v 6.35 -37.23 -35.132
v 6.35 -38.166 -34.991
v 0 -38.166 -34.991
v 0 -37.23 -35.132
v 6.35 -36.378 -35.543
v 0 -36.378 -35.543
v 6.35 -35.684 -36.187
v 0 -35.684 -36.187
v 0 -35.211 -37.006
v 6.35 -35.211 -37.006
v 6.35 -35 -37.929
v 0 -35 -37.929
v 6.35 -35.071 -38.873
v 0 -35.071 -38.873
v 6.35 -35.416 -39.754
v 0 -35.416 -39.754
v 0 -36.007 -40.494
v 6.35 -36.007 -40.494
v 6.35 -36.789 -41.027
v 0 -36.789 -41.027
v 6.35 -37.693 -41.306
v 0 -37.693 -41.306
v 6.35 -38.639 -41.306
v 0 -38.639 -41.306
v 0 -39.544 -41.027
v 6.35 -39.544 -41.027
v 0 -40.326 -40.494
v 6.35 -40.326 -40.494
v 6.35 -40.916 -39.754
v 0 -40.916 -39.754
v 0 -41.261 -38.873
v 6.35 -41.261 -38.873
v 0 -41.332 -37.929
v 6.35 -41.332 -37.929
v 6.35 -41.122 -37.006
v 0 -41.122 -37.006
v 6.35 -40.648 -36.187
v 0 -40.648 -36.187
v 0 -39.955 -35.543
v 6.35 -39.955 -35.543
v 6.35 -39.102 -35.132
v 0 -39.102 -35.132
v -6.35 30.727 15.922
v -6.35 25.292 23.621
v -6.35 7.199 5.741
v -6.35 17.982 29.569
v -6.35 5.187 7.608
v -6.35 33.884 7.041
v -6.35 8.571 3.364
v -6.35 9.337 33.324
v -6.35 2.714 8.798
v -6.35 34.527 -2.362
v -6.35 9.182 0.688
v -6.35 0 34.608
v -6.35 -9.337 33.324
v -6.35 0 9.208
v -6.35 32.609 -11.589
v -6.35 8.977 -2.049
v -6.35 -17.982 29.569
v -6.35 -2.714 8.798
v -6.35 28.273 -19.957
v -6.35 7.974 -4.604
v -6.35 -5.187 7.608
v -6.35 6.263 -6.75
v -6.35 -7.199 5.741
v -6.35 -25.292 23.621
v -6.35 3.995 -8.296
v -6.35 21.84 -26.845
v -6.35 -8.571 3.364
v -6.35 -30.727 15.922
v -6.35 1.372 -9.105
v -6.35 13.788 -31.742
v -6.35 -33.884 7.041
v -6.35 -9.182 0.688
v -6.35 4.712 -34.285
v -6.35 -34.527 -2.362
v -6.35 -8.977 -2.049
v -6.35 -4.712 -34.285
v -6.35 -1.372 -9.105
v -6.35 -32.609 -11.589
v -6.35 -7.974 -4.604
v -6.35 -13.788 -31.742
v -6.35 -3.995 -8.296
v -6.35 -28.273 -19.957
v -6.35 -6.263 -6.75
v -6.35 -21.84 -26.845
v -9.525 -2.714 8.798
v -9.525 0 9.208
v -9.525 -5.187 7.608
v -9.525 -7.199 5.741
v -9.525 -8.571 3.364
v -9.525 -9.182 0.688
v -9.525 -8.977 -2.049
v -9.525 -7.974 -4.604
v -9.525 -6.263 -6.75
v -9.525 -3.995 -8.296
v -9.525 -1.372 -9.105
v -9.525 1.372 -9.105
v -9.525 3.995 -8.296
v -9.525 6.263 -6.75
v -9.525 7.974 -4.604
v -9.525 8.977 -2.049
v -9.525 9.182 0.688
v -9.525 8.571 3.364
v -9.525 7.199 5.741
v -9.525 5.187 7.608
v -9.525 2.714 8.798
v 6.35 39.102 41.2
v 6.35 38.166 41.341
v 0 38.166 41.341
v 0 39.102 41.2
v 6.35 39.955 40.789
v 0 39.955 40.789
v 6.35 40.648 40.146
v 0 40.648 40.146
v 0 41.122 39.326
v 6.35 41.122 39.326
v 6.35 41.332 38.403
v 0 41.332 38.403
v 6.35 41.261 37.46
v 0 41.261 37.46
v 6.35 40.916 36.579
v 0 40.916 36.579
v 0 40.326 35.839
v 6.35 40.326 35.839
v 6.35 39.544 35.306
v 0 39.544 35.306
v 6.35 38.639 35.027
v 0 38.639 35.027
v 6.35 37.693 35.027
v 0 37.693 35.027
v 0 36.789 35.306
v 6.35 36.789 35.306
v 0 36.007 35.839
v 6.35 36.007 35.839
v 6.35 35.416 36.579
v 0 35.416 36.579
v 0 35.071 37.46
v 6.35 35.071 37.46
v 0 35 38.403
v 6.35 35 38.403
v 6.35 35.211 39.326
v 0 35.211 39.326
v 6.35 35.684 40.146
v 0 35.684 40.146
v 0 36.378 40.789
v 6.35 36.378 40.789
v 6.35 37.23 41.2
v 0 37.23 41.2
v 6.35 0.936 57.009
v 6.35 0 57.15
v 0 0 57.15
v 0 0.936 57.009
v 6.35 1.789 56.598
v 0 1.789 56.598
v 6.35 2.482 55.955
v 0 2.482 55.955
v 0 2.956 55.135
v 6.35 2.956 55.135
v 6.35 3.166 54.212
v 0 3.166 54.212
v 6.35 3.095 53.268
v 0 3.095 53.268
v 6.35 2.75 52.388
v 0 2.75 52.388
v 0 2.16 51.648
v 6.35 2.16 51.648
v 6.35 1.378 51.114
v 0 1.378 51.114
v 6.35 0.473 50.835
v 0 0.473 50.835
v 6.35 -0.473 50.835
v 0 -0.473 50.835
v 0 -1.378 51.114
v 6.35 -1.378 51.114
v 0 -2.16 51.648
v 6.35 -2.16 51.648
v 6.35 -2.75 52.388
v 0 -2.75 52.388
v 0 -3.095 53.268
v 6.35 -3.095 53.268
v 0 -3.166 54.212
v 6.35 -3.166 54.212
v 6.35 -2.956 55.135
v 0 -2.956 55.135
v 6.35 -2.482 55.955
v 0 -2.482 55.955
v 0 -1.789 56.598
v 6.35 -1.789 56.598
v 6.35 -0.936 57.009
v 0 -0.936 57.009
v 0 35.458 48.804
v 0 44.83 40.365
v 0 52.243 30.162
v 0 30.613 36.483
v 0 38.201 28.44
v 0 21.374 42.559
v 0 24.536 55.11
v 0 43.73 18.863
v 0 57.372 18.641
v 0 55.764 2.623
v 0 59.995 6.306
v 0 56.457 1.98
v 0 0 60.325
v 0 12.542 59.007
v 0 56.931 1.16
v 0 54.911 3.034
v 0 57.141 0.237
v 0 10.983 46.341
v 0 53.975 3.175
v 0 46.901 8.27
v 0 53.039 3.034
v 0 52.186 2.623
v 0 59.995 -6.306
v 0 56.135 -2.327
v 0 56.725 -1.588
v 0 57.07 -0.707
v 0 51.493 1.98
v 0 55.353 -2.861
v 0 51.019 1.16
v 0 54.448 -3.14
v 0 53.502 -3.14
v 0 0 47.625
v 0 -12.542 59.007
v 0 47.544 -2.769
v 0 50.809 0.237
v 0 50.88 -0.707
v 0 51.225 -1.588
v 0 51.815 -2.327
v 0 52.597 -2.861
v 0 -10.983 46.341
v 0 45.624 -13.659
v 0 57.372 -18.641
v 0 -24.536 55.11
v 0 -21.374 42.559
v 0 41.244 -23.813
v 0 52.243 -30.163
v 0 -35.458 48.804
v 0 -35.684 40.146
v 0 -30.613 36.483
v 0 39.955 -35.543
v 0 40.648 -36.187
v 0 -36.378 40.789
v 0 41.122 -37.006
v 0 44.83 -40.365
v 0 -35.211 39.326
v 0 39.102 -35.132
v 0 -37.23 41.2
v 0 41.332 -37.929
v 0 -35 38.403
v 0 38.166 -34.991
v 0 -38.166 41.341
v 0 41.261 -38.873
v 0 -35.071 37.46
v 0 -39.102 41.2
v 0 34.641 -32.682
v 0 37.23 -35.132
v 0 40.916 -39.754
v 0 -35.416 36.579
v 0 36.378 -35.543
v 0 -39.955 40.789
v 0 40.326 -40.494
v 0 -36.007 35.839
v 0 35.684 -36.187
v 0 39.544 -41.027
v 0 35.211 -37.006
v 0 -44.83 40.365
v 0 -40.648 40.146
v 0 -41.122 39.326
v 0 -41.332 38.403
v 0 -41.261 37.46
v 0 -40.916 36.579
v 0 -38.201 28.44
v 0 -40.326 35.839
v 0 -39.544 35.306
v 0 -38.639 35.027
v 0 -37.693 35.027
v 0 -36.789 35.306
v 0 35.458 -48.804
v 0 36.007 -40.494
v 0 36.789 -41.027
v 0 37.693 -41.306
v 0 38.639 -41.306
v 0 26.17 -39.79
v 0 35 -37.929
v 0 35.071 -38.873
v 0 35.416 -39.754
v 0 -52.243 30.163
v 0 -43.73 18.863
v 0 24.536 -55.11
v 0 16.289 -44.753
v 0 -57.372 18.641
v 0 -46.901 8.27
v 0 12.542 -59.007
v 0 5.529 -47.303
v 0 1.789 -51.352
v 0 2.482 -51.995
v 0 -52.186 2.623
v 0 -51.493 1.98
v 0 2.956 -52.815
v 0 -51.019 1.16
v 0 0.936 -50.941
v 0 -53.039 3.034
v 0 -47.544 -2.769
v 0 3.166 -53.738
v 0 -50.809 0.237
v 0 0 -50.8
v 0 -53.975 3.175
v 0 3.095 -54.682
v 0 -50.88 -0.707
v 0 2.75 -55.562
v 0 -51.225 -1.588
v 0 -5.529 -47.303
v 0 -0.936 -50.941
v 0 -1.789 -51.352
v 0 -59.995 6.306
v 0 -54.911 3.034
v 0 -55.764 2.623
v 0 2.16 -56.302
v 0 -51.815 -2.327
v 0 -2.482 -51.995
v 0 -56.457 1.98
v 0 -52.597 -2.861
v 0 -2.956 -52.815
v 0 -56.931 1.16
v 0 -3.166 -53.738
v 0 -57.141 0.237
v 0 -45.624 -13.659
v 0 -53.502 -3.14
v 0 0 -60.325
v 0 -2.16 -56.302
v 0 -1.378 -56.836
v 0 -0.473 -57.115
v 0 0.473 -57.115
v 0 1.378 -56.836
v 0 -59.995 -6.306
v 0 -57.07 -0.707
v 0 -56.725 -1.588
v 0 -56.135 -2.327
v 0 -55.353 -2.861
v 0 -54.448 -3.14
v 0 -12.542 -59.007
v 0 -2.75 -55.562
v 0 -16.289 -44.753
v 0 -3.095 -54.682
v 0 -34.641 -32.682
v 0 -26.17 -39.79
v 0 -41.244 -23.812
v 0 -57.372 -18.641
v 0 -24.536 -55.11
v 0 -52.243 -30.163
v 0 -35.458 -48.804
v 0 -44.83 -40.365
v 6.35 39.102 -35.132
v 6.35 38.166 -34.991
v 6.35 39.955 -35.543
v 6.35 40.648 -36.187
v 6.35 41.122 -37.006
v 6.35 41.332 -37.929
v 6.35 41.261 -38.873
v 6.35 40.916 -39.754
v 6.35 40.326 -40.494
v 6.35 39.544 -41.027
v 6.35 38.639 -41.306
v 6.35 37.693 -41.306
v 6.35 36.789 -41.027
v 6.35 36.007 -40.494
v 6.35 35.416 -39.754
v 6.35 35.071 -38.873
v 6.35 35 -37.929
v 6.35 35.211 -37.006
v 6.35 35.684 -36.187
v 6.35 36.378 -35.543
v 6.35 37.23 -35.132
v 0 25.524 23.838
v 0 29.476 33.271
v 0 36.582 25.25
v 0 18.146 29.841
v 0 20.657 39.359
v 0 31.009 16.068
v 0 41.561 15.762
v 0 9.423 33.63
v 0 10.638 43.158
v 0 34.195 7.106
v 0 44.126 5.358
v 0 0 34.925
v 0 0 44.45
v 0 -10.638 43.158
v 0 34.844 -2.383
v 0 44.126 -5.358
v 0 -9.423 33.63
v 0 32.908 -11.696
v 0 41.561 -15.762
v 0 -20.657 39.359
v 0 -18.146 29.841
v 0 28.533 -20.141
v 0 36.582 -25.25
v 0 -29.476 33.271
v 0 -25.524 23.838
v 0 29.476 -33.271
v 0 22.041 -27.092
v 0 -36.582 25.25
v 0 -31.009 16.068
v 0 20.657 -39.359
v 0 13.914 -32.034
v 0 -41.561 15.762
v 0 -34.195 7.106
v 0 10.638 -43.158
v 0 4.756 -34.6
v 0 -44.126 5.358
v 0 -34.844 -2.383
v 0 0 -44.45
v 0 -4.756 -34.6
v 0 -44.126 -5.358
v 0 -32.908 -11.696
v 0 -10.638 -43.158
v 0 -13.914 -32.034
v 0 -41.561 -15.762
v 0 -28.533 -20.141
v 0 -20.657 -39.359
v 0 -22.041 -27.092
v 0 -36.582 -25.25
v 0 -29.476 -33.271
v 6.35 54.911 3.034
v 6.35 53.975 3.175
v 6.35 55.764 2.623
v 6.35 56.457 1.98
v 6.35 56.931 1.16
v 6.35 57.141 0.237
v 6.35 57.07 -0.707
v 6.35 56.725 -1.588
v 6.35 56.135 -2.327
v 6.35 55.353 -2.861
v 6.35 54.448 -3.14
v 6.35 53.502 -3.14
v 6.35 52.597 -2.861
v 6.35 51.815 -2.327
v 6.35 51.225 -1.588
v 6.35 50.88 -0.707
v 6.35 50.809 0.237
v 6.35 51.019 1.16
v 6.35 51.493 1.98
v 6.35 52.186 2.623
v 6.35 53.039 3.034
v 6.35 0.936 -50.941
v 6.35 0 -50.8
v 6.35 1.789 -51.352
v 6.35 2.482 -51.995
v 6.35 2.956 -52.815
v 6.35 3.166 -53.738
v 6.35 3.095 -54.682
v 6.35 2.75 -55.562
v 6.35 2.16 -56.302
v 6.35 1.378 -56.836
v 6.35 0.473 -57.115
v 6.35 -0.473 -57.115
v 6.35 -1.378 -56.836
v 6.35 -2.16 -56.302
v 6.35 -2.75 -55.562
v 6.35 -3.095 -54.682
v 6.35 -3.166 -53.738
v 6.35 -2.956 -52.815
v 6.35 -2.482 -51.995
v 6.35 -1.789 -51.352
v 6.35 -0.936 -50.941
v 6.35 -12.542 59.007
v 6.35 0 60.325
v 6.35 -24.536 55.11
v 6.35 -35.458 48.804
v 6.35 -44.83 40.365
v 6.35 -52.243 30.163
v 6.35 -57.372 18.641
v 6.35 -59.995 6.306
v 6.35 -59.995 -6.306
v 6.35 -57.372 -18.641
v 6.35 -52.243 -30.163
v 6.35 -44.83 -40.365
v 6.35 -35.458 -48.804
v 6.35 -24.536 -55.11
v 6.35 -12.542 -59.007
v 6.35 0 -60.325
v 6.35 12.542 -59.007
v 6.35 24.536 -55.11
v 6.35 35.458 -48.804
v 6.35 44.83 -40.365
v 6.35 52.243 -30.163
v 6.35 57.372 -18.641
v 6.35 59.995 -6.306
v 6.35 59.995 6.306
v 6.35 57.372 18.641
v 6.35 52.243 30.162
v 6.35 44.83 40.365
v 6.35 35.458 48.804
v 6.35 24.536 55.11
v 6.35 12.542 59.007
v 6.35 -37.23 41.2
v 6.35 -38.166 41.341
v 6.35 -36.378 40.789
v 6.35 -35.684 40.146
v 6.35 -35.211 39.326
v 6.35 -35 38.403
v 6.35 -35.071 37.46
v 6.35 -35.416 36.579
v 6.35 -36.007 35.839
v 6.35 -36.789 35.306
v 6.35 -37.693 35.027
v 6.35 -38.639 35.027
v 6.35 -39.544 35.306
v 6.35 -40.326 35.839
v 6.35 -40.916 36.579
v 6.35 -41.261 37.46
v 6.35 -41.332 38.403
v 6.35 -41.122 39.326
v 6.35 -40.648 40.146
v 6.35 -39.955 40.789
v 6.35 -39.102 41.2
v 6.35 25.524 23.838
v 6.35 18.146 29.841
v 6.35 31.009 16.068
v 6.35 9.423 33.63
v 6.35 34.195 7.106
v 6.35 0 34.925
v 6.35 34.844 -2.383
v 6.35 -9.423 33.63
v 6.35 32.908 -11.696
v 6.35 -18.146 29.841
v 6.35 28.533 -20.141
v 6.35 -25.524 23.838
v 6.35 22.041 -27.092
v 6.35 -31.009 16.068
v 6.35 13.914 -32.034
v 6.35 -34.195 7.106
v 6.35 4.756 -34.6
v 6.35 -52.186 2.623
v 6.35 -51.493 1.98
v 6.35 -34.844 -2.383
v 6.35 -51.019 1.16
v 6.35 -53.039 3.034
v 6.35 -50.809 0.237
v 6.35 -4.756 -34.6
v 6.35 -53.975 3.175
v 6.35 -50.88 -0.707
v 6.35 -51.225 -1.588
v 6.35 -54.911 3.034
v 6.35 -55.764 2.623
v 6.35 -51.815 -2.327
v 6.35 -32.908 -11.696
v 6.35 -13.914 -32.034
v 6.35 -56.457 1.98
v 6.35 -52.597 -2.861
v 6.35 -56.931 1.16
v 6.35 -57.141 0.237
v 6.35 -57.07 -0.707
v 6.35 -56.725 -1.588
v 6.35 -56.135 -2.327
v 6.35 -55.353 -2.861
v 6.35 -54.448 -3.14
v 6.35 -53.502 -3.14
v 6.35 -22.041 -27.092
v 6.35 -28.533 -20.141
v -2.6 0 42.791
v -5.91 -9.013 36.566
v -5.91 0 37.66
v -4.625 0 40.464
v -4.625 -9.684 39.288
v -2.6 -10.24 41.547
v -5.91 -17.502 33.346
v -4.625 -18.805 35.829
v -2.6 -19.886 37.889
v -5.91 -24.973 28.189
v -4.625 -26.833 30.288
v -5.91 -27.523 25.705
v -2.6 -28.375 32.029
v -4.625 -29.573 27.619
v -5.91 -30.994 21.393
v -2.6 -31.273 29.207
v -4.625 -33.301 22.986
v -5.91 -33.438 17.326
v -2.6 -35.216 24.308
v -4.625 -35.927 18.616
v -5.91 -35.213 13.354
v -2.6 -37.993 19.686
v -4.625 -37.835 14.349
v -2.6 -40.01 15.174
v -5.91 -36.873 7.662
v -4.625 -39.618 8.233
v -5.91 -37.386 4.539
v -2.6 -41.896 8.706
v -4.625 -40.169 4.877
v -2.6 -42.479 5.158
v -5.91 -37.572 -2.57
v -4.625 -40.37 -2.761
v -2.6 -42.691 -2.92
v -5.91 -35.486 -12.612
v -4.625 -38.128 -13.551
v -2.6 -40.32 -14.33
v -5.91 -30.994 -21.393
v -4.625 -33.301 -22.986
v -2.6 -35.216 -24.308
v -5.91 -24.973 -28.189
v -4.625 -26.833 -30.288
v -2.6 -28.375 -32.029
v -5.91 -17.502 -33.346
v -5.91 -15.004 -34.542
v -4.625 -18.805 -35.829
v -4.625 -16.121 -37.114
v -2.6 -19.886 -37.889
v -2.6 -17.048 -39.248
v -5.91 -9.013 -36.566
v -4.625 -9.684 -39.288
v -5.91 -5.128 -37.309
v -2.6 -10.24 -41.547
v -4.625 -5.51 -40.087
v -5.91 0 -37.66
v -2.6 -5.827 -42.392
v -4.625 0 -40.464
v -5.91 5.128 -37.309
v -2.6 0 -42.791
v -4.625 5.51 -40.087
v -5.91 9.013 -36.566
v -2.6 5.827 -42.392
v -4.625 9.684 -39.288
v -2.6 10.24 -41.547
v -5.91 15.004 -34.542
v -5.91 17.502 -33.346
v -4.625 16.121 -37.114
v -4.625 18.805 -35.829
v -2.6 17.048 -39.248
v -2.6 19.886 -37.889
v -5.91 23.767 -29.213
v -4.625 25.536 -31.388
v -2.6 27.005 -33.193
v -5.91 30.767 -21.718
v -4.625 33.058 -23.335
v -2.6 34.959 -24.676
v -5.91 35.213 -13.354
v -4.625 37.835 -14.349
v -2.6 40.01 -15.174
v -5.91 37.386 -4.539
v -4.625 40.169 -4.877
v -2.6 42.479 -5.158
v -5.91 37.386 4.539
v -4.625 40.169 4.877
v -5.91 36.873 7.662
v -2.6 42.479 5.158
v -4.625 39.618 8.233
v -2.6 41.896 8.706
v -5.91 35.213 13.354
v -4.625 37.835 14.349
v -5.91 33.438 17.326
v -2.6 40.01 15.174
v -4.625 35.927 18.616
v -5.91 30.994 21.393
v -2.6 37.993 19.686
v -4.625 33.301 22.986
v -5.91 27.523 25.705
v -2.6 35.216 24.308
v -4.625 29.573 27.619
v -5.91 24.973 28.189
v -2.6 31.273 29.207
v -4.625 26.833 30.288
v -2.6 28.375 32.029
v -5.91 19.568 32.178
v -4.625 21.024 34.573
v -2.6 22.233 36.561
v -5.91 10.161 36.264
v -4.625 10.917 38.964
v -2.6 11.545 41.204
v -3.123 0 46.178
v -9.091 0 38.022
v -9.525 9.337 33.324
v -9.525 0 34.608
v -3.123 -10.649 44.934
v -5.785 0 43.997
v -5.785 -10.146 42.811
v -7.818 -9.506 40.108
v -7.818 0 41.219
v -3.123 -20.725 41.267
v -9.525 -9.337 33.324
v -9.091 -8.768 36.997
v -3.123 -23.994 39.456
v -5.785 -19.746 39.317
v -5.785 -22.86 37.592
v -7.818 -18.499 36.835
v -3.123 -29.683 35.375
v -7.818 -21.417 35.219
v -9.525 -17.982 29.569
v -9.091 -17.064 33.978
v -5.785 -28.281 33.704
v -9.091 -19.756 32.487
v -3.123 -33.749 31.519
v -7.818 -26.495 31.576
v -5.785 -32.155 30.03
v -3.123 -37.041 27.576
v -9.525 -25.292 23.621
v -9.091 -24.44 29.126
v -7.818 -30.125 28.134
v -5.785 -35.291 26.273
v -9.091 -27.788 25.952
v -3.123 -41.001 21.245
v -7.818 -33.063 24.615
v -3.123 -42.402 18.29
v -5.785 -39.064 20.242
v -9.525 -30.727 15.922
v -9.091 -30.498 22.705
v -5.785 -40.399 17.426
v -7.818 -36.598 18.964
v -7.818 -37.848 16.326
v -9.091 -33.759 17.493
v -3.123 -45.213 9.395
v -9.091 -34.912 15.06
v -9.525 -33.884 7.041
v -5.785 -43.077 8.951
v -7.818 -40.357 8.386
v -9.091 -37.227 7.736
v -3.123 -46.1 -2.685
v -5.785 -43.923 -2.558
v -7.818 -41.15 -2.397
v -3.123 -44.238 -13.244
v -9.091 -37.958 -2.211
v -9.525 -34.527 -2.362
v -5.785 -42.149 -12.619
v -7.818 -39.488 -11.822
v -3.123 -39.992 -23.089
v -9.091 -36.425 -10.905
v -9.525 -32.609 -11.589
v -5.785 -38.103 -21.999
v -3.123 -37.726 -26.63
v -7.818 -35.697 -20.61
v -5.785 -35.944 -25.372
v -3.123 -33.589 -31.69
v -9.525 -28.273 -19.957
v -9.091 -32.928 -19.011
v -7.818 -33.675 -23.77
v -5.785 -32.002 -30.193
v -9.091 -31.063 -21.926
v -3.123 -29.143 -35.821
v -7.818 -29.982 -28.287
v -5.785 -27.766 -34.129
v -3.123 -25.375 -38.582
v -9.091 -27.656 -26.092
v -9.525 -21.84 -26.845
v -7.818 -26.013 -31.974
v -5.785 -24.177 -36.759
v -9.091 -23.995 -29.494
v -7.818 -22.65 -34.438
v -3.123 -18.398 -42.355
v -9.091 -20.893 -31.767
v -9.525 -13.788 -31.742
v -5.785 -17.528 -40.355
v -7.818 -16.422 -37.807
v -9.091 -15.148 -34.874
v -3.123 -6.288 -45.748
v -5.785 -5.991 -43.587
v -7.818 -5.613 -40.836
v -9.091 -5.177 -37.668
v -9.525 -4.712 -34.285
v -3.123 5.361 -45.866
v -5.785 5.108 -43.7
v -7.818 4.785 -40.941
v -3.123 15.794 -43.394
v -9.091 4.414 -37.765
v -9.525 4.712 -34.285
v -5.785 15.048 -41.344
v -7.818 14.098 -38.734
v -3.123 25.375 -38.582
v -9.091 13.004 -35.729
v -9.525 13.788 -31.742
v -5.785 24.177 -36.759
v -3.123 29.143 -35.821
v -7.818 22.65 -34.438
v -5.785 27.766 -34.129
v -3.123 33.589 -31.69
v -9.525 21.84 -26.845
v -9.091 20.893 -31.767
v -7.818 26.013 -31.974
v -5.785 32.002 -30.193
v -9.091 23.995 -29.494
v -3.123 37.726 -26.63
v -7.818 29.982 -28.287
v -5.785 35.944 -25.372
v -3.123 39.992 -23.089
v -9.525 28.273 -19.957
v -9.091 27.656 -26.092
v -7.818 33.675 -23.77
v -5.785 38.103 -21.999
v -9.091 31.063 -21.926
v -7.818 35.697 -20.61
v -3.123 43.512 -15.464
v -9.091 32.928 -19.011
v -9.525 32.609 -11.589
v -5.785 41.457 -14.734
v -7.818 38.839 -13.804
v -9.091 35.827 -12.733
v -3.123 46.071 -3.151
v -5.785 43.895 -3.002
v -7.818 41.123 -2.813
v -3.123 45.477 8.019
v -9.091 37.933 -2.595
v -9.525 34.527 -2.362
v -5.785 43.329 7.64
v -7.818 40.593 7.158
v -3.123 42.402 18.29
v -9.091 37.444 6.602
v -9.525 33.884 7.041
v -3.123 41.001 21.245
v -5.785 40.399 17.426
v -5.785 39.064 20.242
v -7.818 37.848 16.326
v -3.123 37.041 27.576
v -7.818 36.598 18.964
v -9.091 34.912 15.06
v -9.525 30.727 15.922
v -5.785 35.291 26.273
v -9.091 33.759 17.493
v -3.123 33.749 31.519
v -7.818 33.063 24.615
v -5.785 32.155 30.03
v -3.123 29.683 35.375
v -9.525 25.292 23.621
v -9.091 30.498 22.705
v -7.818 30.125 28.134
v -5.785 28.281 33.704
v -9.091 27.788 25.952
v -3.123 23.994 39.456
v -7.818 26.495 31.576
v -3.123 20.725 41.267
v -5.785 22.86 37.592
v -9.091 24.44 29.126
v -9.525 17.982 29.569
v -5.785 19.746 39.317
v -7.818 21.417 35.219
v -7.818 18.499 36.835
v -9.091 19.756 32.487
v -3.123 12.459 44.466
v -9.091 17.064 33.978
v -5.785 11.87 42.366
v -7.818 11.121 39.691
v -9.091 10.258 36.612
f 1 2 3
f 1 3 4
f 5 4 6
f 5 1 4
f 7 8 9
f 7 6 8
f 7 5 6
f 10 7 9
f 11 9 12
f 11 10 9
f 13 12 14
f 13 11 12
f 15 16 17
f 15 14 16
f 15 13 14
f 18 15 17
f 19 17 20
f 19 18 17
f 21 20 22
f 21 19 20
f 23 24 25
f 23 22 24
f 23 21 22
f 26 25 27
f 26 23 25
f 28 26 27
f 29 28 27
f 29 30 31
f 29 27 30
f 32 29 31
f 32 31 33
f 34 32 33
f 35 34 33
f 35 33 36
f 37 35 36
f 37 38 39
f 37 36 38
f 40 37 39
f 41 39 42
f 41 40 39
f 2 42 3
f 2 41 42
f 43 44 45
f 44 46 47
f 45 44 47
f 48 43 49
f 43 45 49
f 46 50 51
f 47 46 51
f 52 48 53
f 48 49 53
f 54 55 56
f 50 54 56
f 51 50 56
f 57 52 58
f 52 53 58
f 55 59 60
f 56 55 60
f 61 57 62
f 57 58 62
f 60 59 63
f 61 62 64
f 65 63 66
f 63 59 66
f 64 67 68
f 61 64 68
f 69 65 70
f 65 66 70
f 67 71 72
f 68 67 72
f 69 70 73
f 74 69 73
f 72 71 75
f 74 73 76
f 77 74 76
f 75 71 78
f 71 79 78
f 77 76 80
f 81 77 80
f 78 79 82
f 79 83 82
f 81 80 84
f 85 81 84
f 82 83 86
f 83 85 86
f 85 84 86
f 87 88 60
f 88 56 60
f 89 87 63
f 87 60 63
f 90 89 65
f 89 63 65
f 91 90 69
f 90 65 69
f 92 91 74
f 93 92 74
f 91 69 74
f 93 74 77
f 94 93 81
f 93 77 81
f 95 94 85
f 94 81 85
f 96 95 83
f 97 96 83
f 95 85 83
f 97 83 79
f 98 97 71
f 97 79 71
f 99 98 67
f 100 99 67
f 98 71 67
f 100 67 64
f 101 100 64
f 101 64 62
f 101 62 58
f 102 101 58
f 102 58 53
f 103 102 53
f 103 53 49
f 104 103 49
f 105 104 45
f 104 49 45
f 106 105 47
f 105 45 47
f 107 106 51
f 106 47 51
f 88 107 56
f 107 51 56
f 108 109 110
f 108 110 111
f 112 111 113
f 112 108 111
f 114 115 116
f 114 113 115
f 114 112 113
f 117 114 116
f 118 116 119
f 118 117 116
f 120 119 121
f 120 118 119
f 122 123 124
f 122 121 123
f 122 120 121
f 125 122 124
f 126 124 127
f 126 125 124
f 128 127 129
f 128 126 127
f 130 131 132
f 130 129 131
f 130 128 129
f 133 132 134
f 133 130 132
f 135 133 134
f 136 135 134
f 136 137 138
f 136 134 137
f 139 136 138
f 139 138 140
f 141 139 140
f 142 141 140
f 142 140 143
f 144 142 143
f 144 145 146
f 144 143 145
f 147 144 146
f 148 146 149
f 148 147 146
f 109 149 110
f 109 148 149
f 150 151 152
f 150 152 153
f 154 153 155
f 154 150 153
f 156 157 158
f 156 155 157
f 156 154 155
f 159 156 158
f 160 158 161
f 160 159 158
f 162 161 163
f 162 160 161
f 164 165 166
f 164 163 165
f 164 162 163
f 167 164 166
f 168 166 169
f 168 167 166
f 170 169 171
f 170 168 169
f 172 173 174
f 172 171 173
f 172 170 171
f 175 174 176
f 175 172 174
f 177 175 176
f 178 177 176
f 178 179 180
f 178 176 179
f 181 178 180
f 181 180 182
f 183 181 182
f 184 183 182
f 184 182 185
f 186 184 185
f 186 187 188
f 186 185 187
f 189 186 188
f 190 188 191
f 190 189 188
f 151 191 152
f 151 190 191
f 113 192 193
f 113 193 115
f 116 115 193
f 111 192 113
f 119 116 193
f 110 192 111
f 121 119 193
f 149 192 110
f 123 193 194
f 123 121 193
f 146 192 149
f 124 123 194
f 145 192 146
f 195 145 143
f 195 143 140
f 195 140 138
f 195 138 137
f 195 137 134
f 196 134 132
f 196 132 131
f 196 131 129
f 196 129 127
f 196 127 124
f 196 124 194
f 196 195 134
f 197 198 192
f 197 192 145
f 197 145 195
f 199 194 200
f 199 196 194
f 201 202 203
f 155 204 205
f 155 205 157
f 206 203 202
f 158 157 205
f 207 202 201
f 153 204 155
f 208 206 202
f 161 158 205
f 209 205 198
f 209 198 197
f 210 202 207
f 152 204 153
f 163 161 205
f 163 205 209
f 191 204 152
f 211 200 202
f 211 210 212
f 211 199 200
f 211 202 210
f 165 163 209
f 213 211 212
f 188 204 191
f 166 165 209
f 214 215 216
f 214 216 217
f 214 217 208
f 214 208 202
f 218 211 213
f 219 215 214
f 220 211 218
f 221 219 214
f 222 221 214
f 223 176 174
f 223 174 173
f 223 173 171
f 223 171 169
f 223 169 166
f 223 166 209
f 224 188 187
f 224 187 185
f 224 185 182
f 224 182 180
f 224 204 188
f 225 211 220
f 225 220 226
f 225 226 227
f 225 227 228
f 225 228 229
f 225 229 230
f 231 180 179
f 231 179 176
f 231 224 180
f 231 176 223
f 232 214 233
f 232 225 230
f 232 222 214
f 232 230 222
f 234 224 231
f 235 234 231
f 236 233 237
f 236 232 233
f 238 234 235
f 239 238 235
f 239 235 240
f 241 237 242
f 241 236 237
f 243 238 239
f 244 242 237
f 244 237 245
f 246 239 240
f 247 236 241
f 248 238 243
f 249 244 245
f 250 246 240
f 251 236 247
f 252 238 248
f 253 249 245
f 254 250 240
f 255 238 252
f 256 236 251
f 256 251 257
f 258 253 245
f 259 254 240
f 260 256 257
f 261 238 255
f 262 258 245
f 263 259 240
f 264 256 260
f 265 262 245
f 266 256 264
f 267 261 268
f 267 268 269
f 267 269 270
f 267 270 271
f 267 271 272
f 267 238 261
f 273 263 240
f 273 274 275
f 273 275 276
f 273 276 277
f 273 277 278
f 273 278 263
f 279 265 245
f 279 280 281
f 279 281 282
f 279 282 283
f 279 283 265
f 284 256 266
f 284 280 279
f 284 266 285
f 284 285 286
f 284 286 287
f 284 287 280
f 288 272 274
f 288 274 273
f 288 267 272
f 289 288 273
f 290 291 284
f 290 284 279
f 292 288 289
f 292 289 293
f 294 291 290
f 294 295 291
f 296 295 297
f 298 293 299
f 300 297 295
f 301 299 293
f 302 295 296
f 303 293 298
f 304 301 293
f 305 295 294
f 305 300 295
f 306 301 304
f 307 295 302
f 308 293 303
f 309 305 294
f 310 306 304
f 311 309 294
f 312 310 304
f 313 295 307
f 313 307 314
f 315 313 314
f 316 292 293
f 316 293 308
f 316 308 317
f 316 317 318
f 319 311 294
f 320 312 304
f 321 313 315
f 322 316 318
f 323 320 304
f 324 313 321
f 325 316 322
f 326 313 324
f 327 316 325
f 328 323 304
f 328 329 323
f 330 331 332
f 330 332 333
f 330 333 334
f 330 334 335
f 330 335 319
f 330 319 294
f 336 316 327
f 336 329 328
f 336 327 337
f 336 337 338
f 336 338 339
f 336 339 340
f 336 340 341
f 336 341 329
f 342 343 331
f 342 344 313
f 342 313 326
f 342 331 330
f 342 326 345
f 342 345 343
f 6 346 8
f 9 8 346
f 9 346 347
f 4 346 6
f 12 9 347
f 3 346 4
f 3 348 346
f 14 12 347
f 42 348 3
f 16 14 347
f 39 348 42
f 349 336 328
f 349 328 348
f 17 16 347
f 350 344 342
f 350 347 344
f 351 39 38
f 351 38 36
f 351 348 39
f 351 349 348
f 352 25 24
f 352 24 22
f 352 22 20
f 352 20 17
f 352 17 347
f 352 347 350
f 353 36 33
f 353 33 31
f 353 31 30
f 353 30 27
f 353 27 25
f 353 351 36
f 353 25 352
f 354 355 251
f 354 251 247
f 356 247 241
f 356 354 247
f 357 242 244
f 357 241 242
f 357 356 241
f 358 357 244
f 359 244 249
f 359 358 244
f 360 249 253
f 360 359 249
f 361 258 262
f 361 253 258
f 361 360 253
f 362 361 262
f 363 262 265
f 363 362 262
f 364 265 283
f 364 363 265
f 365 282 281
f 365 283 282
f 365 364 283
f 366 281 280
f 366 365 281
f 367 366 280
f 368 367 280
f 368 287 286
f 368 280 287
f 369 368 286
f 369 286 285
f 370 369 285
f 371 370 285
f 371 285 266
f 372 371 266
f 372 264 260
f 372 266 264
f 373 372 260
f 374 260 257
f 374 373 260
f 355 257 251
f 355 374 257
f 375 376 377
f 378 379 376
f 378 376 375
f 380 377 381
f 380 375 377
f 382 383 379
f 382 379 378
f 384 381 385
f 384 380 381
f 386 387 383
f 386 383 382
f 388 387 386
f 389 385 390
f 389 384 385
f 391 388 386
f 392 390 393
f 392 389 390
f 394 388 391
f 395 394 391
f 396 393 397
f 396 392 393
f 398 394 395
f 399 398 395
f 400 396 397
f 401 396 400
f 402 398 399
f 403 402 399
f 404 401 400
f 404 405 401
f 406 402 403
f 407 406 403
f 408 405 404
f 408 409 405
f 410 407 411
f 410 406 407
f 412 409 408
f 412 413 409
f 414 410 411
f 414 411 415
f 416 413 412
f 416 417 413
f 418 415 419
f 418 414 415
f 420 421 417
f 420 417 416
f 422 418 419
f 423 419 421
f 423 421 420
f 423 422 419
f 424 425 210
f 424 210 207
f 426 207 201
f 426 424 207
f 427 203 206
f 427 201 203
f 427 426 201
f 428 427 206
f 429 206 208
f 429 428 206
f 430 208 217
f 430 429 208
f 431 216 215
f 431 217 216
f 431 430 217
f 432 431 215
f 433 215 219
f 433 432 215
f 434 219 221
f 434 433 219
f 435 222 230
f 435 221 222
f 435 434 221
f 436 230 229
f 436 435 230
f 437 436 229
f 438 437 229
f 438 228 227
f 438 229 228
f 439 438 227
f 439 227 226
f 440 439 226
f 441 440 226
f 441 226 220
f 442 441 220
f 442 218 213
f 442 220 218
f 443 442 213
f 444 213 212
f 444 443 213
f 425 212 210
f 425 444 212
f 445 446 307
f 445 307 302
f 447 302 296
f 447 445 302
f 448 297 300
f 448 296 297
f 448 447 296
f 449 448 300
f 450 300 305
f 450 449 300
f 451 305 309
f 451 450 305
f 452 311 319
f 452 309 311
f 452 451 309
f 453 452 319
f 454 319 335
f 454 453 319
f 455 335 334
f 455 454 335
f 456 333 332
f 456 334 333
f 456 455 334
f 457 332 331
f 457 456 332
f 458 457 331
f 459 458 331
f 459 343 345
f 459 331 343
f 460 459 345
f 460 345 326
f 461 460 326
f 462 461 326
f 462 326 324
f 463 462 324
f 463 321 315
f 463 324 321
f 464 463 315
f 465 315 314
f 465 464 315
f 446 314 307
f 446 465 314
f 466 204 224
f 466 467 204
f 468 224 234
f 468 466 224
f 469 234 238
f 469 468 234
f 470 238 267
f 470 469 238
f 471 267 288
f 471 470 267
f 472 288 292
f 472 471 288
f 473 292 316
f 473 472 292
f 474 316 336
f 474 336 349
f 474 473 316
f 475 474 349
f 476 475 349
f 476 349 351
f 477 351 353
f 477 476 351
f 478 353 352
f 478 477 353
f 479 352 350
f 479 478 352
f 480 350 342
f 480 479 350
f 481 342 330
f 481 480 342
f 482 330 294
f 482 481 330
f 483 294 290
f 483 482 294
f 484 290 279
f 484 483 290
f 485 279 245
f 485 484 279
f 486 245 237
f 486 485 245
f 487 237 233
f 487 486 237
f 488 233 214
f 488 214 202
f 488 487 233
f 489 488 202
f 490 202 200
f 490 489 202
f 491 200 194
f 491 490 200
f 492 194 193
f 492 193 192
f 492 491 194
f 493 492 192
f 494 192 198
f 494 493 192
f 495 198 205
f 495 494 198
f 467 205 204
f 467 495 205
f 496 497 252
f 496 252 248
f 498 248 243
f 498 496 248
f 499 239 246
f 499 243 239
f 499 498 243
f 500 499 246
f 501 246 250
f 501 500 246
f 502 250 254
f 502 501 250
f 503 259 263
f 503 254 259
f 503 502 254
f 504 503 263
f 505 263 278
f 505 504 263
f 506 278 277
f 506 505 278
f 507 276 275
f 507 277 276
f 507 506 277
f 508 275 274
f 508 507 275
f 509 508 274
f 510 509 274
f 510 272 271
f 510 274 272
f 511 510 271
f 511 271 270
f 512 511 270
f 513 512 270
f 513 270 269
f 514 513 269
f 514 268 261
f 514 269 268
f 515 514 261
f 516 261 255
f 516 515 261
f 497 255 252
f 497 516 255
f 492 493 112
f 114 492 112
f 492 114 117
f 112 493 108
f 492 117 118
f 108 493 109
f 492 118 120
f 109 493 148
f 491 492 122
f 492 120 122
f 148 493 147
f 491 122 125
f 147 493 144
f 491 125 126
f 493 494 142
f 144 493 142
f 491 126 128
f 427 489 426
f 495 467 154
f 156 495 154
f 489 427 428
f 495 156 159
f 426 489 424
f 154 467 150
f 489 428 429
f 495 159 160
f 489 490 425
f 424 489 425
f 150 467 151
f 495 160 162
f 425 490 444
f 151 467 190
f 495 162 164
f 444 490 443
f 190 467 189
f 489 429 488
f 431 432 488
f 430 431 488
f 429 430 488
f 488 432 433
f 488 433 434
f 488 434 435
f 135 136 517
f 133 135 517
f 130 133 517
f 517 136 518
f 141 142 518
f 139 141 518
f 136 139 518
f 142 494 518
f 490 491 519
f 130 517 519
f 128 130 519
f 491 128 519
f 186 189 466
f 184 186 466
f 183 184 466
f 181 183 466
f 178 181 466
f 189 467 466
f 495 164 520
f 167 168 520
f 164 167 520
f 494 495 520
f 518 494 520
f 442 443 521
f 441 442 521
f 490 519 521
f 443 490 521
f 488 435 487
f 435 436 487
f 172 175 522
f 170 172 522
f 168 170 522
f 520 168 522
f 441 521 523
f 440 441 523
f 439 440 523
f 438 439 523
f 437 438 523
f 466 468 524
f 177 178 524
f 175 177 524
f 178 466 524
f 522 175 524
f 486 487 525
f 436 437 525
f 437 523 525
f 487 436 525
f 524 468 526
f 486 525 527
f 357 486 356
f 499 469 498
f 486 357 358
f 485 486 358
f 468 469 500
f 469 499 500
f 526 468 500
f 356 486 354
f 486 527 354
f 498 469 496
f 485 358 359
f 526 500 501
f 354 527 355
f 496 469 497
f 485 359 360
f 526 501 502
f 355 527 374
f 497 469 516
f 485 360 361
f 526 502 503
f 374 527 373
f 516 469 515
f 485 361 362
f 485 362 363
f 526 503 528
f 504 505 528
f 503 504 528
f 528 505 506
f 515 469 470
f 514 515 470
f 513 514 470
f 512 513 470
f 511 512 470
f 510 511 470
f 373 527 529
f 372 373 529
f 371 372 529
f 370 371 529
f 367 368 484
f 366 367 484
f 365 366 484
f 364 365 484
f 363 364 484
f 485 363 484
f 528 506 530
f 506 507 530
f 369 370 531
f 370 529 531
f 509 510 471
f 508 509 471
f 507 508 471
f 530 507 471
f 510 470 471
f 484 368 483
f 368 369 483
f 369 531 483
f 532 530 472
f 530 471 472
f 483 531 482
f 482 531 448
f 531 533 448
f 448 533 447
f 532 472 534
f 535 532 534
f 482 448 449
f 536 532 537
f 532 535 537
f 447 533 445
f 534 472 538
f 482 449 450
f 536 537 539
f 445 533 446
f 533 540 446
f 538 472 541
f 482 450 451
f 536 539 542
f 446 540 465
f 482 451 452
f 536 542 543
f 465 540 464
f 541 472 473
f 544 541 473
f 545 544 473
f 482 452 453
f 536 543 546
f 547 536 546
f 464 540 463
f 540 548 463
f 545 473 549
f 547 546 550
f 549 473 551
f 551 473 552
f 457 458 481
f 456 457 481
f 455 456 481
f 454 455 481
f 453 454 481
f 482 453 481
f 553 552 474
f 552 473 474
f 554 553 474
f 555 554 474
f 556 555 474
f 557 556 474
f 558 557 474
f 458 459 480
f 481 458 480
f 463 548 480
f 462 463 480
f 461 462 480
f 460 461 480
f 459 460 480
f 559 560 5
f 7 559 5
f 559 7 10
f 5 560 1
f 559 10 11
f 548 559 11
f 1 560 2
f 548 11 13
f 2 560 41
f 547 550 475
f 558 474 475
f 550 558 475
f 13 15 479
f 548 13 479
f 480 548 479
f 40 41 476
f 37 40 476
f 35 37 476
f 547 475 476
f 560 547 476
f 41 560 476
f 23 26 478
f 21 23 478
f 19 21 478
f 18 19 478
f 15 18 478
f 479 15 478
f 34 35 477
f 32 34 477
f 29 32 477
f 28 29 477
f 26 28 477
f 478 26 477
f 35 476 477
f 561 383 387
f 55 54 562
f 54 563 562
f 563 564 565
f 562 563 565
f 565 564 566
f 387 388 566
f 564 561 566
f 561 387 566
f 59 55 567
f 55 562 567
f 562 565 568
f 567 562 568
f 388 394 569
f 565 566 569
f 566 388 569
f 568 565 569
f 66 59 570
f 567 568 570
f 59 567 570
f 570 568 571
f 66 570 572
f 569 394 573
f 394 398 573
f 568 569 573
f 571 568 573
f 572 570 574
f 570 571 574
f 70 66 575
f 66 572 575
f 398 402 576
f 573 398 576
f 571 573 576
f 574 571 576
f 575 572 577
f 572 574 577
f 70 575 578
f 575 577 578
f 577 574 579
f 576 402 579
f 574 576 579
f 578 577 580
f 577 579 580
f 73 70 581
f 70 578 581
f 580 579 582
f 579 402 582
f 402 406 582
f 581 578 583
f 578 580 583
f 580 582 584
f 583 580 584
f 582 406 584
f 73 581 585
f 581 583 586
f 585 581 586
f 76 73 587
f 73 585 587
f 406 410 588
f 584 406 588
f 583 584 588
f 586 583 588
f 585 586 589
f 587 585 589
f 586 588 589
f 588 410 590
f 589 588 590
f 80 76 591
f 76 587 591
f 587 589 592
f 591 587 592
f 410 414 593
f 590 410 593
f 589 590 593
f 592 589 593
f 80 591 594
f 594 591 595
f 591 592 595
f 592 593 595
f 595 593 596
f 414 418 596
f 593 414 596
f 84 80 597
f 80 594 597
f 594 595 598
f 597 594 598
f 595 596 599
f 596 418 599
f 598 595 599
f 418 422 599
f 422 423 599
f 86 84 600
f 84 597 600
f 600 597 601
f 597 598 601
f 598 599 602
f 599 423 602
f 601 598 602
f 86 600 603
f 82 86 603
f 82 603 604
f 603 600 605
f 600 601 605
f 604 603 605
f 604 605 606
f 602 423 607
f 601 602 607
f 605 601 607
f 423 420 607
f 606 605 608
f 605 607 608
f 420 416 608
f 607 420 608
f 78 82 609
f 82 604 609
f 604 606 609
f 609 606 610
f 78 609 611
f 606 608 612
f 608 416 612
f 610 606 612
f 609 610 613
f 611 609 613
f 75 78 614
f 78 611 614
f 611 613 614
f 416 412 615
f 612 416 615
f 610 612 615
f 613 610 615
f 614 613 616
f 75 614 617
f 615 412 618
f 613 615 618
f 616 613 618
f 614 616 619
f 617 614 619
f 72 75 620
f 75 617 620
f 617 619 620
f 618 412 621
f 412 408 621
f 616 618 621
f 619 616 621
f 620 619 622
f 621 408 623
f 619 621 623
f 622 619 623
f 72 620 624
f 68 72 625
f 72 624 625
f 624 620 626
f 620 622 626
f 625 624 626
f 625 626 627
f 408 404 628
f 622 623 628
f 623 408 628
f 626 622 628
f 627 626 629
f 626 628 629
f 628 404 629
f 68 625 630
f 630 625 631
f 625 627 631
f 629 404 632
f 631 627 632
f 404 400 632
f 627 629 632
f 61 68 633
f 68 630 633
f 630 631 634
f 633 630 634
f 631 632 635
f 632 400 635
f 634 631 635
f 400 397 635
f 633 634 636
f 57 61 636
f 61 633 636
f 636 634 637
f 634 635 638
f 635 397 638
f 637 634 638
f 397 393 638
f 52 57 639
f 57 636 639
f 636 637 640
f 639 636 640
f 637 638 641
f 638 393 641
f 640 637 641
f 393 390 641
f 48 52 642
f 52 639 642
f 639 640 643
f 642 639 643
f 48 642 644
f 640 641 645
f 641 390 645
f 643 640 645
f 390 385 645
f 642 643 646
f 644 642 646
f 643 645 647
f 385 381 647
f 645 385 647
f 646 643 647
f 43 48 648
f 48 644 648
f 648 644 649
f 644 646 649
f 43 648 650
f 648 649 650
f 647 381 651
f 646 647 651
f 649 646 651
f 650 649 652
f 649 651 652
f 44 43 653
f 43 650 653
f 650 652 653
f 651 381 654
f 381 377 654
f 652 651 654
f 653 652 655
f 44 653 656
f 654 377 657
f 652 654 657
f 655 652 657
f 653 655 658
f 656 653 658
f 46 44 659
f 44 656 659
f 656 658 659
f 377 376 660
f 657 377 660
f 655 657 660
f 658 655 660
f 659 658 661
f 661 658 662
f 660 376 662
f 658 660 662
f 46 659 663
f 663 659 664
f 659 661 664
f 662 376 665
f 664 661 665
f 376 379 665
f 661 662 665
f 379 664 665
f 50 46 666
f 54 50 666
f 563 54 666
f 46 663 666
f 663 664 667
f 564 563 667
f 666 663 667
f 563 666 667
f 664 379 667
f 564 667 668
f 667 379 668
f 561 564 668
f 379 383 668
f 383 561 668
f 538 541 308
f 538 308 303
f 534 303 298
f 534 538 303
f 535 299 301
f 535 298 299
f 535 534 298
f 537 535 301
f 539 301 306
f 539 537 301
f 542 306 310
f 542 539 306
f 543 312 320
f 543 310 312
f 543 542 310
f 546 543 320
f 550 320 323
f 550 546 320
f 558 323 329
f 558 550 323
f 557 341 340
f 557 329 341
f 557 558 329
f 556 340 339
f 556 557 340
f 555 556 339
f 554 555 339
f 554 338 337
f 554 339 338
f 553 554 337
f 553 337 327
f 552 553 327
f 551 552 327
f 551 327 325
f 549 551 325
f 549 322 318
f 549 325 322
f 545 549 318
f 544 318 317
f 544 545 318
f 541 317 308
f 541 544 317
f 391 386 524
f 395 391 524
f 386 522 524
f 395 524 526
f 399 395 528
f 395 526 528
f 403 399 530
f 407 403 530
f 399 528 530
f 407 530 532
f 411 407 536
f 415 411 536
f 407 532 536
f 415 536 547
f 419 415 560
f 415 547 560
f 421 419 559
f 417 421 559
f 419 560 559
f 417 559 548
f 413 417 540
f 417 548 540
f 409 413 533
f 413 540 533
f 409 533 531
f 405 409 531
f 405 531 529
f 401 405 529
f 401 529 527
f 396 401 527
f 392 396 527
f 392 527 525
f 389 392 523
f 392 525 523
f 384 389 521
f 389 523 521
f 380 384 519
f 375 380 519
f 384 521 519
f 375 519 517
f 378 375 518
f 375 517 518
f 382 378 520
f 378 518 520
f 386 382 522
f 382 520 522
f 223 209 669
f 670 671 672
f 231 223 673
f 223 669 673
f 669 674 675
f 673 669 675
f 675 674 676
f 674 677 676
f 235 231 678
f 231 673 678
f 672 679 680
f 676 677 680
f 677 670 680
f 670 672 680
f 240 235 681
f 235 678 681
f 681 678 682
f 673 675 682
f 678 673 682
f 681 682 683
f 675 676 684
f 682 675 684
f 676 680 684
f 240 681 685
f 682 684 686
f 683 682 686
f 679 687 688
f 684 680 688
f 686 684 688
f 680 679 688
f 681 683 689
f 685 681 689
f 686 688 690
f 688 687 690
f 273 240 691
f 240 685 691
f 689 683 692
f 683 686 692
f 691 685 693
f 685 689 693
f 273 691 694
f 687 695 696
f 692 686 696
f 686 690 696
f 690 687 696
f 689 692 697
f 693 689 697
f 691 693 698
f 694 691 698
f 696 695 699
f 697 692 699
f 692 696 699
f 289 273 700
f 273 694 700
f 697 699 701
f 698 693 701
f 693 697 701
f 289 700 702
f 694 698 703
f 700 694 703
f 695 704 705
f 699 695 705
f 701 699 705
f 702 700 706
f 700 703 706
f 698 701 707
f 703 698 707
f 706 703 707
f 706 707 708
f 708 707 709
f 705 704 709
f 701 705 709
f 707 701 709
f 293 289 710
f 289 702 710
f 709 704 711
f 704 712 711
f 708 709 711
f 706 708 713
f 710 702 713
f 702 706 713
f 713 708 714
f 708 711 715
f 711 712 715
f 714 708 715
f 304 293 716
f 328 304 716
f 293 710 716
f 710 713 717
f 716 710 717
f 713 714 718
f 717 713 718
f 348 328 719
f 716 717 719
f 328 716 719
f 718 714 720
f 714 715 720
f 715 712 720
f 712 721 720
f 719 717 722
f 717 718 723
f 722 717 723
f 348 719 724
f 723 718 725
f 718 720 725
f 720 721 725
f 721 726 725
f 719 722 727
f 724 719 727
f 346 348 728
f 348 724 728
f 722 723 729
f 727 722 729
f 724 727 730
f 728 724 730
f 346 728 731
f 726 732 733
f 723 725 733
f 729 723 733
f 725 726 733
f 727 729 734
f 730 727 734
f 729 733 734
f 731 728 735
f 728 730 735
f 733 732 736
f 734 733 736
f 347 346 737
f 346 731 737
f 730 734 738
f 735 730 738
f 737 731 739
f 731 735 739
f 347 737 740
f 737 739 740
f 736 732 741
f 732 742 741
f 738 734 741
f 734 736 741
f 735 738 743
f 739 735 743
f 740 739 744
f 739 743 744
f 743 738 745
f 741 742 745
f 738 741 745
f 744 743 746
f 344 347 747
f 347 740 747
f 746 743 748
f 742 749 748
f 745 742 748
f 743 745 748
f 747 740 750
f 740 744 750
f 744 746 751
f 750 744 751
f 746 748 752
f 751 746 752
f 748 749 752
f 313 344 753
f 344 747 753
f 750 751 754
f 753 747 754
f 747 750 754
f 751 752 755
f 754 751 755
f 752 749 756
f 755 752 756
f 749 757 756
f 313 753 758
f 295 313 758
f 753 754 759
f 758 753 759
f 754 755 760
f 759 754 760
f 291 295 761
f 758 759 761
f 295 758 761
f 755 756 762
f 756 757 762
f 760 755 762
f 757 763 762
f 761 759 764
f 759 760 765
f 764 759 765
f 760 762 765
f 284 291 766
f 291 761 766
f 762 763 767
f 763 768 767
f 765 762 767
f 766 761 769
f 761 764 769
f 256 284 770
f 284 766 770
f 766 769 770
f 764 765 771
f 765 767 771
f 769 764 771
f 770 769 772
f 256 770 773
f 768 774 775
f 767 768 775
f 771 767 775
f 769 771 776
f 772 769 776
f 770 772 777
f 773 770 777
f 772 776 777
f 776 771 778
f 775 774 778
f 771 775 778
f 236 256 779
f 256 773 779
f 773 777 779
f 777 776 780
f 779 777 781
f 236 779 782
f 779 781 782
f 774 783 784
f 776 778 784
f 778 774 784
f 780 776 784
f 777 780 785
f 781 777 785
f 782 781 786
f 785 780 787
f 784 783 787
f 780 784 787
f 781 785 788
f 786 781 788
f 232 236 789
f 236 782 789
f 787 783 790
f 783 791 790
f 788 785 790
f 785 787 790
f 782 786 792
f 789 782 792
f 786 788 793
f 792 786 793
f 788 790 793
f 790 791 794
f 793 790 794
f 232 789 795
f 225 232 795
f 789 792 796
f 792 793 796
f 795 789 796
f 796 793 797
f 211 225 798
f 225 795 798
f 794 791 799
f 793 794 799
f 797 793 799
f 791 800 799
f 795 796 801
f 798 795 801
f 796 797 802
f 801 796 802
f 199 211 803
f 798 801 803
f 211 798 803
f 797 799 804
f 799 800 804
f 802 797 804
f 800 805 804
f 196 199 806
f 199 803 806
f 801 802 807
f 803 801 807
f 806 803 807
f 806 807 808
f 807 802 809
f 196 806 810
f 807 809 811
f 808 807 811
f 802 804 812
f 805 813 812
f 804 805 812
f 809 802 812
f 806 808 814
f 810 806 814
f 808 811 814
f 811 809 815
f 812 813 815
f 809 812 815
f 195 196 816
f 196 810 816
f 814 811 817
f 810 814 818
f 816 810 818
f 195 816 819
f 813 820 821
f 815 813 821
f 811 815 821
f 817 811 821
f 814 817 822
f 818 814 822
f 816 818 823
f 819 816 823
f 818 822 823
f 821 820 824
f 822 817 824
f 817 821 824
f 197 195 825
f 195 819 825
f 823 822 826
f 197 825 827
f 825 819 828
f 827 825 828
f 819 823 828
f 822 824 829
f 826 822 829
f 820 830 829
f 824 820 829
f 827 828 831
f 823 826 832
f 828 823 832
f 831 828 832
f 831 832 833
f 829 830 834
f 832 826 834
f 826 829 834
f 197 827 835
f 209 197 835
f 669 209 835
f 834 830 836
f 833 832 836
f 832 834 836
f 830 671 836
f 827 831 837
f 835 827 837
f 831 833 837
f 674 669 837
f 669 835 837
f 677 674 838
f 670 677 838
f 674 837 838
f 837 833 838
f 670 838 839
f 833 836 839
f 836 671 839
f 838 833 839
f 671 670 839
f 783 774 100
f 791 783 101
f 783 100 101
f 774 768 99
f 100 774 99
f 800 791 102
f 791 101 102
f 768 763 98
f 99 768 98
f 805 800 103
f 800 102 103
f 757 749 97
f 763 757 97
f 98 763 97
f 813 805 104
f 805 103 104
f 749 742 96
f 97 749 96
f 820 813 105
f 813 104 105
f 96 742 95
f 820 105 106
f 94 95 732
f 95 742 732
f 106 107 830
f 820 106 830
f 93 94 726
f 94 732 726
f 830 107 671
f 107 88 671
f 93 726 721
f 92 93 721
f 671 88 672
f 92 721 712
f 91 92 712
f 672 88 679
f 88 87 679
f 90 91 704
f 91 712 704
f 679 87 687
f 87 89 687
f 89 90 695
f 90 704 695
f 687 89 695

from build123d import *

# Parameters (mm, degrees)
SKETCH2_W               = 6.35
SKETCH2_H               = 25.4
CUT_EXTRUDE1_DEPTH      = 86.84251205
CUT_EXTRUDE1_DEPTH_BACK = 86.84251205
SKETCH3_R               = 3.175


with BuildPart() as part:
    # Sketch2 → Revolve1 (revolve)
    with BuildSketch(Plane.XY, mode=Mode.PRIVATE) as revolve1_sk:
        with BuildLine():
            ThreePointArc((-6.35, 34.6075), (-4.624734672, 40.464062692), (0, 44.45))
            Line((0, 44.45), (0, 47.625))
            ThreePointArc((0, 47.625), (-6.88946039, 42.67256248), (-9.525, 34.6075))
            Line((-9.525, 34.6075), (-9.525, 9.2075))
            Line((-9.525, 9.2075), (-6.35, 9.2075))
            Line((-6.35, 9.2075), (-6.35, 34.6075))
        make_face()
        with Locations((3.175, 47.625)):
            Rectangle(SKETCH2_W, SKETCH2_H)
    revolve(revolve1_sk.sketch.rotate(Axis((-978.527794003, 0, 0), (1, 0, 0)), 90), axis=Axis((-978.527794003, 0, 0), (1, 0, 0)))

    # Sketch3 → Cut-Extrude1 (cut, two sides: drawn at the far end of the back side and taken through both)
    with BuildSketch(Plane.ZY.offset(-CUT_EXTRUDE1_DEPTH_BACK)):
        with Locations((0, 53.975)):
            Circle(SKETCH3_R)
        with Locations((38.166088515, 38.166088515)):
            Circle(SKETCH3_R)
        with Locations((53.975, 0)):
            Circle(SKETCH3_R)
        with Locations((38.166088515, -38.166088515)):
            Circle(SKETCH3_R)
        with Locations((0, -53.975)):
            Circle(SKETCH3_R)
        with Locations((-38.166088515, -38.166088515)):
            Circle(SKETCH3_R)
        with Locations((-53.975, 0)):
            Circle(SKETCH3_R)
        with Locations((-38.166088515, 38.166088515)):
            Circle(SKETCH3_R)
    extrude(amount=CUT_EXTRUDE1_DEPTH + CUT_EXTRUDE1_DEPTH_BACK, mode=Mode.SUBTRACT)


solid = part.part
